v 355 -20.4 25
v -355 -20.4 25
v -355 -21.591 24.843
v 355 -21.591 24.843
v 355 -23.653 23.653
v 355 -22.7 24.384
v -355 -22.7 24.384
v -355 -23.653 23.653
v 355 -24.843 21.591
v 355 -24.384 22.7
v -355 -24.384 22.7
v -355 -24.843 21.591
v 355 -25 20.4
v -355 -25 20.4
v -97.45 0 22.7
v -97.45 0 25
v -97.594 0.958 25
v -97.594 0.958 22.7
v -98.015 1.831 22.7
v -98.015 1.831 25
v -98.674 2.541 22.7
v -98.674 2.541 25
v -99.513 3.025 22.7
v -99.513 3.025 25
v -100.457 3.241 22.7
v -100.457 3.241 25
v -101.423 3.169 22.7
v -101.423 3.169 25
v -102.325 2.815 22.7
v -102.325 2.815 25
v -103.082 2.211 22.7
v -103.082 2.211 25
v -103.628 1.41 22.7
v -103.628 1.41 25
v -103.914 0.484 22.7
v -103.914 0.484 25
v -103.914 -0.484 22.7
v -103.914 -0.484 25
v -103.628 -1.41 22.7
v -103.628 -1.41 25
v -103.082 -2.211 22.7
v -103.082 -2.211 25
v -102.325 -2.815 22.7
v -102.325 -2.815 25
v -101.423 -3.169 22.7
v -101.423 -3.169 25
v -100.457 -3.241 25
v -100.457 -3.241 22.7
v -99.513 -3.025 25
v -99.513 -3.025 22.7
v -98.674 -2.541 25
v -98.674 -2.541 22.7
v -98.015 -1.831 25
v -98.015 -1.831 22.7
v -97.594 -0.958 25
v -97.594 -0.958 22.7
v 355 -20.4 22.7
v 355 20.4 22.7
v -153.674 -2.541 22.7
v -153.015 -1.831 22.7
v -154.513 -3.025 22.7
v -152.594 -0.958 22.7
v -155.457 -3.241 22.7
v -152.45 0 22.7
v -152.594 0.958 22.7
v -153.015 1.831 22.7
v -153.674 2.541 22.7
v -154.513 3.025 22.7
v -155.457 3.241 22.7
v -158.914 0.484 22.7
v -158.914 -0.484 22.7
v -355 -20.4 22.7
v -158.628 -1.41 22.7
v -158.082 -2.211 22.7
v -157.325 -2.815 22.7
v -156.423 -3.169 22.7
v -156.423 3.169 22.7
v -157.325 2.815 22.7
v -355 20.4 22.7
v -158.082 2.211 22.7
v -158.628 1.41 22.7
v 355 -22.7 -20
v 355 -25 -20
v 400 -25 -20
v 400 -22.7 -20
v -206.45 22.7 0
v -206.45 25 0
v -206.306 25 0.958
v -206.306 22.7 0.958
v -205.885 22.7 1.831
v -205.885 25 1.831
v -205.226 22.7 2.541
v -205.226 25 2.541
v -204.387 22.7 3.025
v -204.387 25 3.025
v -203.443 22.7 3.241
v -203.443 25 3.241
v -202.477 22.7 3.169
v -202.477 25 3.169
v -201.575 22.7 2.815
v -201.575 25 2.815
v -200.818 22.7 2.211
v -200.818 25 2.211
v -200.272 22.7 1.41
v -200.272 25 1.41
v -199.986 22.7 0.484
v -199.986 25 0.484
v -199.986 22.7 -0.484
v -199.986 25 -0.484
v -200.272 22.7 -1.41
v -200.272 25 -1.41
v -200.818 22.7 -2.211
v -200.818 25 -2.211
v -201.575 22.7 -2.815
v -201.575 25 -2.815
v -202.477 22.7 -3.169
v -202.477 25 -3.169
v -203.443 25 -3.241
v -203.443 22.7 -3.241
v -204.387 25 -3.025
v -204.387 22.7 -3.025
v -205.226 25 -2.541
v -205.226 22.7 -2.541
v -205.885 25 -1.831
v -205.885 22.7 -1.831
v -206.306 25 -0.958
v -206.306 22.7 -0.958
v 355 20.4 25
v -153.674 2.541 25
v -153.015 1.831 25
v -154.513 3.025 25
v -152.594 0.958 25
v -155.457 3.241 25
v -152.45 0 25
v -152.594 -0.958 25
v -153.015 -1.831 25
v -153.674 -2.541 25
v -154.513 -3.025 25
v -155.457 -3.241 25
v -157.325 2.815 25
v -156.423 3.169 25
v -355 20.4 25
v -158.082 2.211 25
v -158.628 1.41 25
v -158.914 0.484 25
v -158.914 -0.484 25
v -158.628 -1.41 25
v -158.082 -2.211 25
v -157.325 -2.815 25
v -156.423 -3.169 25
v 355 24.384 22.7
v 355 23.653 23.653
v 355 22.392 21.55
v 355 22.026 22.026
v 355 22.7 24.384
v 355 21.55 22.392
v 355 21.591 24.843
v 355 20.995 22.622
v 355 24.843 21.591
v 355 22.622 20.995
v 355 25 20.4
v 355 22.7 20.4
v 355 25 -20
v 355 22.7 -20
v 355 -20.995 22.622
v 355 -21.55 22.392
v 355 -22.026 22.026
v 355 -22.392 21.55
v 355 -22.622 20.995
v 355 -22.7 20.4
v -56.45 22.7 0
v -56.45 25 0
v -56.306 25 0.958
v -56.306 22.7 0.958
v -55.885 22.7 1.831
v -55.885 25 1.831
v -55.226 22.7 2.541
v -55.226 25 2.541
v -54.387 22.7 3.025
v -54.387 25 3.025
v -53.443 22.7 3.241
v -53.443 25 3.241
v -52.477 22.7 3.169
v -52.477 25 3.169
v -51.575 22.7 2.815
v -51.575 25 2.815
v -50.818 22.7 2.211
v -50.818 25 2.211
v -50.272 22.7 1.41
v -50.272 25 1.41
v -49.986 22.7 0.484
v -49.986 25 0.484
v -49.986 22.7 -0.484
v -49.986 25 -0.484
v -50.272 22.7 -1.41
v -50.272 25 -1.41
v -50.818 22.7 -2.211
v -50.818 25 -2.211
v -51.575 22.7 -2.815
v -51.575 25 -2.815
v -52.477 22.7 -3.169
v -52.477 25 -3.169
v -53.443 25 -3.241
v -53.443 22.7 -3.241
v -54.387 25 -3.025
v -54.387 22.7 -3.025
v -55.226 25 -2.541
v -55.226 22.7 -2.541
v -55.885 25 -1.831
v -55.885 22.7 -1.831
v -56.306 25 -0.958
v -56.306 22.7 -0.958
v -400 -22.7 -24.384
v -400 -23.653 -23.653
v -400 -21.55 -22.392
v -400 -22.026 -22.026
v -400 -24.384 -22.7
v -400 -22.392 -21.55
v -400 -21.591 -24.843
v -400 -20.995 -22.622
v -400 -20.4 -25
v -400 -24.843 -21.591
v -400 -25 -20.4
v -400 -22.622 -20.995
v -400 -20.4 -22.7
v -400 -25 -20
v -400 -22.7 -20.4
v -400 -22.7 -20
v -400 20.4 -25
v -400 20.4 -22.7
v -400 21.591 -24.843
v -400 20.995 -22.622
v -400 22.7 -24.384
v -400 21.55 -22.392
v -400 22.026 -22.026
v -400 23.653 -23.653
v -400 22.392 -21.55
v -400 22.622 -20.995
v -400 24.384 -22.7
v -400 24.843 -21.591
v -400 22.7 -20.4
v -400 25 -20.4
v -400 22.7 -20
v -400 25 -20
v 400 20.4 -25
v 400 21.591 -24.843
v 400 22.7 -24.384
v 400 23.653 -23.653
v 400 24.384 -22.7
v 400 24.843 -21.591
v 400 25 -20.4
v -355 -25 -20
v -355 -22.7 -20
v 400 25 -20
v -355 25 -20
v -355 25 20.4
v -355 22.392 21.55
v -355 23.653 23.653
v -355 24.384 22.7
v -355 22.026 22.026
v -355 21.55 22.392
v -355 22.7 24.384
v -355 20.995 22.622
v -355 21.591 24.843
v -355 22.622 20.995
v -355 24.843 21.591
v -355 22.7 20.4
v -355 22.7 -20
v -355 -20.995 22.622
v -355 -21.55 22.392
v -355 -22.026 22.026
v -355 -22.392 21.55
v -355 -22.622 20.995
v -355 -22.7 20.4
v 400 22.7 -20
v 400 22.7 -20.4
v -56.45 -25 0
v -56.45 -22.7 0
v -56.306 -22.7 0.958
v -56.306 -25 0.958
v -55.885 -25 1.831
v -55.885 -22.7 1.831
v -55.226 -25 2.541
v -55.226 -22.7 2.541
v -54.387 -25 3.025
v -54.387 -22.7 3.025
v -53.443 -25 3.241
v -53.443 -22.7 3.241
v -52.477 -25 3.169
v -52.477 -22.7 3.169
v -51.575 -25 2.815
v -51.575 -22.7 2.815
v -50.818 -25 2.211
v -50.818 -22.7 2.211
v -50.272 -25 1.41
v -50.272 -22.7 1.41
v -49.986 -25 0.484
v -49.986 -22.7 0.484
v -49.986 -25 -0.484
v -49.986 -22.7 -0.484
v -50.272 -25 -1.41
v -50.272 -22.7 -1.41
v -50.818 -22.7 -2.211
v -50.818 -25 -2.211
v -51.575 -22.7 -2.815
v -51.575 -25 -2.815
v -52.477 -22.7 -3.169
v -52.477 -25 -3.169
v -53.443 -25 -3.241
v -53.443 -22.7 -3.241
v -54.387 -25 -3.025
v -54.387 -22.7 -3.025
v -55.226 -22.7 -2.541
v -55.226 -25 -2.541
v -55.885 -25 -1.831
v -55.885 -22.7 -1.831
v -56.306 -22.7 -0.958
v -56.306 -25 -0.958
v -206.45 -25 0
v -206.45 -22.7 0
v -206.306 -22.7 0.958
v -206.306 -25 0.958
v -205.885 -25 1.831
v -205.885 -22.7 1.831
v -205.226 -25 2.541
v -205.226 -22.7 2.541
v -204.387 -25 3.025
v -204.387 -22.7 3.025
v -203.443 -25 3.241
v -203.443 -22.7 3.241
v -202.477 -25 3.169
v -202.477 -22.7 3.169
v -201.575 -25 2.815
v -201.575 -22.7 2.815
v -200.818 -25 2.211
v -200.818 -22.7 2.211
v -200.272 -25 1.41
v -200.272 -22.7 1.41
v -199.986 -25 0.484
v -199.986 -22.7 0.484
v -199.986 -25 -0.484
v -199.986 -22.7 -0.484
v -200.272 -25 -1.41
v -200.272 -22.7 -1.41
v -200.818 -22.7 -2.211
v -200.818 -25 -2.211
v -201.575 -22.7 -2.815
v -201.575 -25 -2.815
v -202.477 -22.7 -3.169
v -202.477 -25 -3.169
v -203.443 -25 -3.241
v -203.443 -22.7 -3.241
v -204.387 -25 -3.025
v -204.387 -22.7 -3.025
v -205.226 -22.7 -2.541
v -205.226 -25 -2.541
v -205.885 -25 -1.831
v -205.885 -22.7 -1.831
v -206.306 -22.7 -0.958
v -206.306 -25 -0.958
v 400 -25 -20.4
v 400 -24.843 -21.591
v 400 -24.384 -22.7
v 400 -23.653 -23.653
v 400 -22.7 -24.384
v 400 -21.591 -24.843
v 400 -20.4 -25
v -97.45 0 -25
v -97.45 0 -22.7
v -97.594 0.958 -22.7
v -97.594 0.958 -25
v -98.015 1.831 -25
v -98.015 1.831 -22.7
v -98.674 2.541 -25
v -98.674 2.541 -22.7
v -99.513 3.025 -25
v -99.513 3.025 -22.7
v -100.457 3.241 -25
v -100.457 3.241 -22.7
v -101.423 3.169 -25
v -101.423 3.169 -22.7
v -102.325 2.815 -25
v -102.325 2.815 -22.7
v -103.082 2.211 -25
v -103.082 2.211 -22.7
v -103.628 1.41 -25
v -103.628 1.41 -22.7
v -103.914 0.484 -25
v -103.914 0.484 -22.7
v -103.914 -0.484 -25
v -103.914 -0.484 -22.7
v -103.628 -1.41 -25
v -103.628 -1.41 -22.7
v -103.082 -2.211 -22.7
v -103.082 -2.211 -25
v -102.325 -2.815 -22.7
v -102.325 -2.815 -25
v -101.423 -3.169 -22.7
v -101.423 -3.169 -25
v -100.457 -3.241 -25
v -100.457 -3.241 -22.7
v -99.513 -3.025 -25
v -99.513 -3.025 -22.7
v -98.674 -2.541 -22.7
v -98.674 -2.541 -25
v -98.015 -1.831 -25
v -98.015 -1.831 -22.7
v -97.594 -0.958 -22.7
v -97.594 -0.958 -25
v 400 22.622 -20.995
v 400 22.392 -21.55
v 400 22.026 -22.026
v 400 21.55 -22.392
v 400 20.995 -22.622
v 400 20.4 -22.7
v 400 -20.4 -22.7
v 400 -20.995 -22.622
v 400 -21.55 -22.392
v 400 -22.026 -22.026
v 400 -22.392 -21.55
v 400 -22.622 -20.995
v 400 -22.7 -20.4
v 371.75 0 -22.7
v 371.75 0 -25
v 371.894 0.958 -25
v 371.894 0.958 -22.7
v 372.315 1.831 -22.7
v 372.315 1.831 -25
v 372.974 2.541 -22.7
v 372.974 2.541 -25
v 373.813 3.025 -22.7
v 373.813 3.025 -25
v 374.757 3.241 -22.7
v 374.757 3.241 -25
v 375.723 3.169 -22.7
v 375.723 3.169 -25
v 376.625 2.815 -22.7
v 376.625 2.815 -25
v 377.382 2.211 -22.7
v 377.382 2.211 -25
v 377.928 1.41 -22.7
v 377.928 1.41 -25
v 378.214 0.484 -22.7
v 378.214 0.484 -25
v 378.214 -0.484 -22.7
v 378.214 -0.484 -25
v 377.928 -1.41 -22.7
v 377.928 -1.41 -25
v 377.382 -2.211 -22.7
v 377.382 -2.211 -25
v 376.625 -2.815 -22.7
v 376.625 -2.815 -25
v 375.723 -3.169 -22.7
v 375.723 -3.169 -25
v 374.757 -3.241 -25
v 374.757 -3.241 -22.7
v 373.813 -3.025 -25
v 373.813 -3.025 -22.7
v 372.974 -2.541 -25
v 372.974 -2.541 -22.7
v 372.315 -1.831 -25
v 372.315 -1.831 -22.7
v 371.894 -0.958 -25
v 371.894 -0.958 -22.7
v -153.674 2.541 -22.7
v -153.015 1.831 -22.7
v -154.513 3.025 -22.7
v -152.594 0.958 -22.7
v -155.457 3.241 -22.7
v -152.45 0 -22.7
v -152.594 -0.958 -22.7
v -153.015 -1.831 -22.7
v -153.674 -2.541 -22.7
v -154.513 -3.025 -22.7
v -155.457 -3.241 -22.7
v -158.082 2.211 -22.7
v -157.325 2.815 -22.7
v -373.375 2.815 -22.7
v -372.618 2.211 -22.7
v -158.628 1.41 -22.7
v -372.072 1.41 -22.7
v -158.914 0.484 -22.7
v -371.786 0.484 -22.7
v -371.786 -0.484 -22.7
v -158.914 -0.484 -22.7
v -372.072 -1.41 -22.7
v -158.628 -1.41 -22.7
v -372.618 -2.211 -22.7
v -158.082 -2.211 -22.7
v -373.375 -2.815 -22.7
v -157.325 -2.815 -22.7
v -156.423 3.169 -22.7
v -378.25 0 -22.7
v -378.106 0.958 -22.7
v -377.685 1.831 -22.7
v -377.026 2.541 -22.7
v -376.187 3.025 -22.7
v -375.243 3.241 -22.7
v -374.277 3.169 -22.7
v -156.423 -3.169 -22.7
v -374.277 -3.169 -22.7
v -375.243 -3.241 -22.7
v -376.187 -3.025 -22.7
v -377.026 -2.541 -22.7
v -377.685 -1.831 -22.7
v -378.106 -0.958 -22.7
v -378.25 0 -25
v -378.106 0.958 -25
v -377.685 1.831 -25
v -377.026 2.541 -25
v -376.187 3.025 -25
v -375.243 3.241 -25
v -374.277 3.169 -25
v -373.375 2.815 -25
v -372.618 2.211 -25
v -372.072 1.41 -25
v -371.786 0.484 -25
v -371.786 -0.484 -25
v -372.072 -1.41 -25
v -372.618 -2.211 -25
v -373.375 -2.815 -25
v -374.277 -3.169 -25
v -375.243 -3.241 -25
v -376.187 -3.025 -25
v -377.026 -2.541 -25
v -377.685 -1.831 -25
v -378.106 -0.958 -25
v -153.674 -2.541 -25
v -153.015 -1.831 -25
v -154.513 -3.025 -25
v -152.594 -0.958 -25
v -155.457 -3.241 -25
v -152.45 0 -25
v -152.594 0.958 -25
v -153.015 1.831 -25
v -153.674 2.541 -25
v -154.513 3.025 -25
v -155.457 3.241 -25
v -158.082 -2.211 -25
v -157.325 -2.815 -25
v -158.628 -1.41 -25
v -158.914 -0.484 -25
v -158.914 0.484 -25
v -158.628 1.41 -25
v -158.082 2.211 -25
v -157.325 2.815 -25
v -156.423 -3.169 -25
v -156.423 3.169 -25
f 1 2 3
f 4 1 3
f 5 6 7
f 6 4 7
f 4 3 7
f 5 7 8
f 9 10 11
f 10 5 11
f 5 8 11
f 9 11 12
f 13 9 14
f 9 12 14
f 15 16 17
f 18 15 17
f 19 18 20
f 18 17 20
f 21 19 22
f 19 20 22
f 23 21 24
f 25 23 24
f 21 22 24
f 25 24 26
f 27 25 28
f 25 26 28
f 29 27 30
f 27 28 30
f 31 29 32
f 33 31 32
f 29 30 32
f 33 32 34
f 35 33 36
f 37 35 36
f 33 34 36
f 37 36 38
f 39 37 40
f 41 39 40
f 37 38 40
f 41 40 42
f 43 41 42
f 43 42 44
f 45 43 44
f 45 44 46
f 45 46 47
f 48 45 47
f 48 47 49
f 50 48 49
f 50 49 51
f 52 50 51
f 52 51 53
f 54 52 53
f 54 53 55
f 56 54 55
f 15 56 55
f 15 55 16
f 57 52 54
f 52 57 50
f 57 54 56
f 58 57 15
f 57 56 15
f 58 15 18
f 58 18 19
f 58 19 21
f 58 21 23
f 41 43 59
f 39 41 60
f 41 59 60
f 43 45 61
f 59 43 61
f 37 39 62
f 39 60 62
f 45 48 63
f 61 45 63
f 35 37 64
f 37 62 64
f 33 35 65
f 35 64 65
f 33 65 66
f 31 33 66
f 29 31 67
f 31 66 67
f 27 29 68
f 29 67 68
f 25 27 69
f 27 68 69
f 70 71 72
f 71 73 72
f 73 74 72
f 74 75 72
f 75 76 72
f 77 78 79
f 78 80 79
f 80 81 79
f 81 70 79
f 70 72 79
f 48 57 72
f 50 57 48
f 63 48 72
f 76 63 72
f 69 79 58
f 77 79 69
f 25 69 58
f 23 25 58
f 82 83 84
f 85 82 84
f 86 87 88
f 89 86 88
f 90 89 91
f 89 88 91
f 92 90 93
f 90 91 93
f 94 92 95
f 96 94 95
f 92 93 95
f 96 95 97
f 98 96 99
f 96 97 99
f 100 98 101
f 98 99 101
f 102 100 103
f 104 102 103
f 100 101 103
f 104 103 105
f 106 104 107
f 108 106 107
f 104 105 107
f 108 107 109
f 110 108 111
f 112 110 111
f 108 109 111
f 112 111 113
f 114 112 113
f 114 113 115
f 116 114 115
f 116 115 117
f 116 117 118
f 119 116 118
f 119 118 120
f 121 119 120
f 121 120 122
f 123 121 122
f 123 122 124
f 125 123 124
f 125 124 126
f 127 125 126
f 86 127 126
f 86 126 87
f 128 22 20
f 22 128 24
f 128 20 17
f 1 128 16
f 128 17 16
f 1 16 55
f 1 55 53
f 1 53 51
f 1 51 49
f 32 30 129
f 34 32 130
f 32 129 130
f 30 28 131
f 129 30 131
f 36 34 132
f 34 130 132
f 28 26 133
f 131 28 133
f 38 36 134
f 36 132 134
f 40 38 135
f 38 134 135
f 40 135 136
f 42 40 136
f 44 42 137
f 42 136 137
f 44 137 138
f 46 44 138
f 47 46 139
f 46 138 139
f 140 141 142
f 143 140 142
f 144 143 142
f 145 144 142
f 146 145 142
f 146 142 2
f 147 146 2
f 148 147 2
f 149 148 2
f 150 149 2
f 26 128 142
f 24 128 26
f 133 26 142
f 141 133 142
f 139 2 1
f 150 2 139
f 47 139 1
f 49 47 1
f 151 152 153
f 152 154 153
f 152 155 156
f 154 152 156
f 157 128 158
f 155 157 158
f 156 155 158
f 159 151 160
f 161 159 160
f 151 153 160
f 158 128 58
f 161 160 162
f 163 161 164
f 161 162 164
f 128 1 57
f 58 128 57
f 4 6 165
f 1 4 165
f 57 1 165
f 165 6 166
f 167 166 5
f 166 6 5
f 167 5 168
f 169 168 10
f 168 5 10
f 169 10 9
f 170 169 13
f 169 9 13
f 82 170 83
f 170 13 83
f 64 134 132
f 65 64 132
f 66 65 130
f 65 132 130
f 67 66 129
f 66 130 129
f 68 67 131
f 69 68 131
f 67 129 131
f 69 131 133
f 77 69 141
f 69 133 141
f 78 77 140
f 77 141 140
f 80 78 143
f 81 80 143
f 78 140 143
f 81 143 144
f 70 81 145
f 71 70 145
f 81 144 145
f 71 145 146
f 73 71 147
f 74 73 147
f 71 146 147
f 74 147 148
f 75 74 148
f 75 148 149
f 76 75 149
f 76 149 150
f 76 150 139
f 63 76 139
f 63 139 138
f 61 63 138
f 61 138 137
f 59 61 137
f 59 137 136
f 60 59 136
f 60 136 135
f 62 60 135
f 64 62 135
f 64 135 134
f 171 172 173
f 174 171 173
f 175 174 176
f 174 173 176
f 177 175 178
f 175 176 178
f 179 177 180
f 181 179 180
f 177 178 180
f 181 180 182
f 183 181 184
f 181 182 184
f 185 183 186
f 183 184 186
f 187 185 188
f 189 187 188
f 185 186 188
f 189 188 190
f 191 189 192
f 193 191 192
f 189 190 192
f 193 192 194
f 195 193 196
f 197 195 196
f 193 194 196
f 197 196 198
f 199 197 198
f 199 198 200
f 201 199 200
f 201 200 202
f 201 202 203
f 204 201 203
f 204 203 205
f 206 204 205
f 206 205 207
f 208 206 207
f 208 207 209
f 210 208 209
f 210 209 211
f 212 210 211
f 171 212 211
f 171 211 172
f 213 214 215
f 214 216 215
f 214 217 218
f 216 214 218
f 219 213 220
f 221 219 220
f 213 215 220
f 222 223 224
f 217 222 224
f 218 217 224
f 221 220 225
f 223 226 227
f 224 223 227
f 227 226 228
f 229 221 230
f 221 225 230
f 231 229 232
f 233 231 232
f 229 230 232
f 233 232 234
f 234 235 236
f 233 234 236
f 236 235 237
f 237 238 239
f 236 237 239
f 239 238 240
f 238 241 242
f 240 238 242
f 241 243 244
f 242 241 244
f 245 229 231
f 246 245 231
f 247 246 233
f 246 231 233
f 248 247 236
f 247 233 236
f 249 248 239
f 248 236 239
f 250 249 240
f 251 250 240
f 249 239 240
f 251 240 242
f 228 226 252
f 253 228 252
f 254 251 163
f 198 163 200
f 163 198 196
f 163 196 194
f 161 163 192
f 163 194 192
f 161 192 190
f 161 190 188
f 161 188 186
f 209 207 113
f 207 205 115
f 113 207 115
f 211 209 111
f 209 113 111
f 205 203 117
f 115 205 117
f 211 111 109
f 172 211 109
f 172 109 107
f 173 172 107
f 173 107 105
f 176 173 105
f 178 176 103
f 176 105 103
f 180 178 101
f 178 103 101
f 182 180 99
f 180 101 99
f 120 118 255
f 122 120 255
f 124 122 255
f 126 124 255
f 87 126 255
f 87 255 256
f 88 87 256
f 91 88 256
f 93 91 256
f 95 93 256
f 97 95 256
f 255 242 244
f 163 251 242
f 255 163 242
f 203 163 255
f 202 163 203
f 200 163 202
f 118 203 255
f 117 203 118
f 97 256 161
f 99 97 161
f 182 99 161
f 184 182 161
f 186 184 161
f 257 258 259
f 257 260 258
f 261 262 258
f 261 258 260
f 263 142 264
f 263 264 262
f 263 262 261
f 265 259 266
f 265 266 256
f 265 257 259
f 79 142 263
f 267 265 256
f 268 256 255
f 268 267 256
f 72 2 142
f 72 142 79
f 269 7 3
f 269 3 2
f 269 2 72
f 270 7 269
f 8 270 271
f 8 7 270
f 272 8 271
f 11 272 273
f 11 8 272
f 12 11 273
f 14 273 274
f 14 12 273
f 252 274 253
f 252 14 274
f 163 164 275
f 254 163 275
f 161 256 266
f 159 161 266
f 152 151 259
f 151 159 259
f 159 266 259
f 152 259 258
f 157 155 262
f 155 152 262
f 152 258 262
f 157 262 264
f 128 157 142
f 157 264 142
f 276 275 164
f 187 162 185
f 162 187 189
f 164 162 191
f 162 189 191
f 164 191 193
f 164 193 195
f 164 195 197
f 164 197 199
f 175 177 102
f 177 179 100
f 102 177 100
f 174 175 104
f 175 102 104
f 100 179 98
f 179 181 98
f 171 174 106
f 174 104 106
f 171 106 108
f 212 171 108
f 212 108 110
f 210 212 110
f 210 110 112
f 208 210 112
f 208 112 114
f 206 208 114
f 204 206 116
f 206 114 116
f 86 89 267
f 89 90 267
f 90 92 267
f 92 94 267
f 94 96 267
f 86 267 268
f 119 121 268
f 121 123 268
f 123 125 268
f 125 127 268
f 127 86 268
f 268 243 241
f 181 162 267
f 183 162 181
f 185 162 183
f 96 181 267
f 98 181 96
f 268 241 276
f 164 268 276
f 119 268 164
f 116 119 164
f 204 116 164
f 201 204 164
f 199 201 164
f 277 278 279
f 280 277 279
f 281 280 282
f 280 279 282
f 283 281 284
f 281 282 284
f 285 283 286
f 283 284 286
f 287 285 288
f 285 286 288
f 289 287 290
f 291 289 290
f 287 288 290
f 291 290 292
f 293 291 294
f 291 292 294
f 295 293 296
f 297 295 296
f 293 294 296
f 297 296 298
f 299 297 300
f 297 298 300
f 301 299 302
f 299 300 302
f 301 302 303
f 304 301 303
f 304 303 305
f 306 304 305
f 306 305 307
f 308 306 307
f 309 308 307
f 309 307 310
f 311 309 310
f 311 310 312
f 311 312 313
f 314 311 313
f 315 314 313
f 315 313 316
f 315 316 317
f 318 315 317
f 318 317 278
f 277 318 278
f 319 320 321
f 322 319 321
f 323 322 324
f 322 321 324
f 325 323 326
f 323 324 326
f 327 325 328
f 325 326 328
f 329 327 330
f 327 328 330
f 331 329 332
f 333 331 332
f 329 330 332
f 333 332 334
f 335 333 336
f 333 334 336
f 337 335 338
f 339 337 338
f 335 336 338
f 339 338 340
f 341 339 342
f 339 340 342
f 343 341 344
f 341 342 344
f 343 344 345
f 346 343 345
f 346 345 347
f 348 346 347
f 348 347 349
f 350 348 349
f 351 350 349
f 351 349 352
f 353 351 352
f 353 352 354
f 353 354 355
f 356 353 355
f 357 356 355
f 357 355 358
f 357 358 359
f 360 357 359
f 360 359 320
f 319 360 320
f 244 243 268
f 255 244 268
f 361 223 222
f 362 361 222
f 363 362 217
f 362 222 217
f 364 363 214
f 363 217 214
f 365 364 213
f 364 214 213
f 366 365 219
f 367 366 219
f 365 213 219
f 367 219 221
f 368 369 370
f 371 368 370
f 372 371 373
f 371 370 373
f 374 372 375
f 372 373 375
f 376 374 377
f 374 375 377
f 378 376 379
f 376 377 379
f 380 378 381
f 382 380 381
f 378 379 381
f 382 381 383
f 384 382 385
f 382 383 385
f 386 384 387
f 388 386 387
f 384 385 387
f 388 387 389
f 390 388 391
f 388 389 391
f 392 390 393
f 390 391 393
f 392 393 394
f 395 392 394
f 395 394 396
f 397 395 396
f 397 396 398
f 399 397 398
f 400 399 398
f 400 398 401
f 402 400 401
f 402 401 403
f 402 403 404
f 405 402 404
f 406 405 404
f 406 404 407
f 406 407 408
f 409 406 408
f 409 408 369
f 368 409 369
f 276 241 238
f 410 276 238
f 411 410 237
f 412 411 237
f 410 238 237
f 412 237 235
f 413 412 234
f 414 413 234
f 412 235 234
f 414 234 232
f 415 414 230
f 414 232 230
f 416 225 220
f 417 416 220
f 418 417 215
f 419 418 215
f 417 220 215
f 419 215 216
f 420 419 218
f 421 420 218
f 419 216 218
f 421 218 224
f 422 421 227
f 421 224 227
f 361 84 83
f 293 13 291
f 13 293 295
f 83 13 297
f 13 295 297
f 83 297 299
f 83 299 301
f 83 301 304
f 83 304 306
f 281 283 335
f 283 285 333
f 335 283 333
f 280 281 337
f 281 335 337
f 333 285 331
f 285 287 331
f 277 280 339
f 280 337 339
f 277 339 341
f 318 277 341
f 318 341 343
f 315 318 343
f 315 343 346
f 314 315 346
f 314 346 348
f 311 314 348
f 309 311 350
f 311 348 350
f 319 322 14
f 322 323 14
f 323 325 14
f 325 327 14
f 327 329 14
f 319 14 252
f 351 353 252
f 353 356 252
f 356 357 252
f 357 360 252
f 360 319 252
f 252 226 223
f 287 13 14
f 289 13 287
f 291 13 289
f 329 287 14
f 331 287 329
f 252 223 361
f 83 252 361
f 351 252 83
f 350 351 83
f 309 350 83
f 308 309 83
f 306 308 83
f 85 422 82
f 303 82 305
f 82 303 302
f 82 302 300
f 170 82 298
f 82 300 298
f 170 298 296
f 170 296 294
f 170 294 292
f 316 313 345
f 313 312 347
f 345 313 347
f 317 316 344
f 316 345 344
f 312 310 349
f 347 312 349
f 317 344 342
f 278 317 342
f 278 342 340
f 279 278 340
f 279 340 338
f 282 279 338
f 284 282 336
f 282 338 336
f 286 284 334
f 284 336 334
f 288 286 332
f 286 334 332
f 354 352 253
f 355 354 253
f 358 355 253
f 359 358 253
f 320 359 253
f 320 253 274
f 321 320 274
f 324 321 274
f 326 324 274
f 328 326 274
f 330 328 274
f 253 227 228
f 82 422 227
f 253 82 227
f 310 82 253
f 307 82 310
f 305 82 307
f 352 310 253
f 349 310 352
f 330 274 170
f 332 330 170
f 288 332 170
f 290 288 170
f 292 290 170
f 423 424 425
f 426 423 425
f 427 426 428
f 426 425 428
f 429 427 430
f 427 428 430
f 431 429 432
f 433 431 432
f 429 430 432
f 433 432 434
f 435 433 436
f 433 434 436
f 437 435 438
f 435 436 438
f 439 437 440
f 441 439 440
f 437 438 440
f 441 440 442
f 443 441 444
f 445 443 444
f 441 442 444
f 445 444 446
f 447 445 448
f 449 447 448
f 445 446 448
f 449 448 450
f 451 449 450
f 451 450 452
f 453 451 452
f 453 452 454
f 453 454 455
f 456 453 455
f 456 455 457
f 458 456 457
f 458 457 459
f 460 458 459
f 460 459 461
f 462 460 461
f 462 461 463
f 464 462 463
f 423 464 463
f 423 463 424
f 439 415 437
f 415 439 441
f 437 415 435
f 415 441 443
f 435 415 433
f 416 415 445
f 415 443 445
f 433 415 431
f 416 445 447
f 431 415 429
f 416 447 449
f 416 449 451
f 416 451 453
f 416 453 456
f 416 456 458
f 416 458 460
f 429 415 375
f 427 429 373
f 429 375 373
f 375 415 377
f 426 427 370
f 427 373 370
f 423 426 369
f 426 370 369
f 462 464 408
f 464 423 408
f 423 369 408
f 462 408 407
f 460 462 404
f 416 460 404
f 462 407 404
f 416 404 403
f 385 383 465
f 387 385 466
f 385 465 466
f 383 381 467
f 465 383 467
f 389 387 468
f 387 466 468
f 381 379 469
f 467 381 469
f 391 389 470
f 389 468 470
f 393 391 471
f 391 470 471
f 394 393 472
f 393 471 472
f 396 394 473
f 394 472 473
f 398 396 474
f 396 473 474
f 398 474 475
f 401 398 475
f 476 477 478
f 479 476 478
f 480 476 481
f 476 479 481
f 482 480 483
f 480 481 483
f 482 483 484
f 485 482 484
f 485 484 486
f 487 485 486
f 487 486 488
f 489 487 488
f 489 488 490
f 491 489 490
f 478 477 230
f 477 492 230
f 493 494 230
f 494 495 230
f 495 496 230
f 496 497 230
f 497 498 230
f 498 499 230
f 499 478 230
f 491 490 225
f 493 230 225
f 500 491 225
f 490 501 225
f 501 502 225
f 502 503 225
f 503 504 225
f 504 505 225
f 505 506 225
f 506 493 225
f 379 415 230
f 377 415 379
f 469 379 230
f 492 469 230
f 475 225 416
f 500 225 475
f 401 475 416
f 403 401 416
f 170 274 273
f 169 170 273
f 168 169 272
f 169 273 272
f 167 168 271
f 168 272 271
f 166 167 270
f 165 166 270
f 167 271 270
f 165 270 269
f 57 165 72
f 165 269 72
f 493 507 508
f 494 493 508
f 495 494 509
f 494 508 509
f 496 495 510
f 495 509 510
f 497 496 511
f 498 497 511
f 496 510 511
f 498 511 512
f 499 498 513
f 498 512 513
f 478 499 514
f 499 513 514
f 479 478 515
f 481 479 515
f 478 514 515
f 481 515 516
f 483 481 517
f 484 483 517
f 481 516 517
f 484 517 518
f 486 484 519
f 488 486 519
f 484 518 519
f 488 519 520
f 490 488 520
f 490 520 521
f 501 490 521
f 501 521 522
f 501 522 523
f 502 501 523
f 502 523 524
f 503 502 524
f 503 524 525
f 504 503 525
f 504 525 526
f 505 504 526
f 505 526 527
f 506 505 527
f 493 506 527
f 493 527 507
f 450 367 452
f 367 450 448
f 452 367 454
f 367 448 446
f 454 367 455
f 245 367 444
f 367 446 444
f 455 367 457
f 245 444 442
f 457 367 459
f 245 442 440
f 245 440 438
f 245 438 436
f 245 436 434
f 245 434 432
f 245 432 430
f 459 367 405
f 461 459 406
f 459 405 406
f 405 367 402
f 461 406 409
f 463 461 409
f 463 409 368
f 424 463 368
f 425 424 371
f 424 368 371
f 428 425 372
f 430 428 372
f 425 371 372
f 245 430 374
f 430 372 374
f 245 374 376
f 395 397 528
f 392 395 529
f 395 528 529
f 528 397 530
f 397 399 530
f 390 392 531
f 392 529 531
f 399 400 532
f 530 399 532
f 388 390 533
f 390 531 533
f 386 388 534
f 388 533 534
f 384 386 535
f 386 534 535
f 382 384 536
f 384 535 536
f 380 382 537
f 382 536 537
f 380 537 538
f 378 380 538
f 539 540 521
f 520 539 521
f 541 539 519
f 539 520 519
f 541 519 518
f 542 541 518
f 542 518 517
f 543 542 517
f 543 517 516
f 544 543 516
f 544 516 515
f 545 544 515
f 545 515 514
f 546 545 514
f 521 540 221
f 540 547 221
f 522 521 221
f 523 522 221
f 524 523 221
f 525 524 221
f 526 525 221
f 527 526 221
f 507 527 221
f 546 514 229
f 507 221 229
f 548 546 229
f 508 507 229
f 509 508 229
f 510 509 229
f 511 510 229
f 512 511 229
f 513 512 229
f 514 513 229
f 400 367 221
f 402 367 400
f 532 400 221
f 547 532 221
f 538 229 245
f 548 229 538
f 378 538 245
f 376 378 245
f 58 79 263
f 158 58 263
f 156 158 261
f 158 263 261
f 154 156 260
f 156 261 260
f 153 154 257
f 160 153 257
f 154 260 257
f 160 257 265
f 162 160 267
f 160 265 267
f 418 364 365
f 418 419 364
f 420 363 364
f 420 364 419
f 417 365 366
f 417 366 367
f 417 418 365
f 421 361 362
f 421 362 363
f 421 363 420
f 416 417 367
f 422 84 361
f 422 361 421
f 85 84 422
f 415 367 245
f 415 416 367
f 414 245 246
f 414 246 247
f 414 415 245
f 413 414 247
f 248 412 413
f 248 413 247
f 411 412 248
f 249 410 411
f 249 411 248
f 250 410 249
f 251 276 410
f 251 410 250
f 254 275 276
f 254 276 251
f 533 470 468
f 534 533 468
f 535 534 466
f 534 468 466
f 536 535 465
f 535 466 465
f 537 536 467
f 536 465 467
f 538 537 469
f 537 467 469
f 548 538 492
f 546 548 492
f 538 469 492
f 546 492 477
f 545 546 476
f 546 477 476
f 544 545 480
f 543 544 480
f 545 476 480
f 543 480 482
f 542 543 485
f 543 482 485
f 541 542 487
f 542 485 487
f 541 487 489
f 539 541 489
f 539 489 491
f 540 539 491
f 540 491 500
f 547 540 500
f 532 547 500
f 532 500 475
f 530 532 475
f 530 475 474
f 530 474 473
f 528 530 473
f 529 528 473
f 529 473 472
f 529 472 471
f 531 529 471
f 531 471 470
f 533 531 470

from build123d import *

# Parameters (mm, degrees)
SHS_C450_AS_50X50X2_3_SHS_C450_1_DEPTH = 800
CUT_EXTRUDE1_DEPTH                     = 402.559460105
CUT_EXTRUDE1_DEPTH_BACK                = 402.559460105
SKETCH20_W                             = 45
SKETCH20_H                             = 45
SKETCH21_R                             = 3.25
CUT_EXTRUDE2_DEPTH                     = 10
SKETCH22_R                             = 3.25
CUT_EXTRUDE3_DEPTH                     = 404.887360535
SKETCH23_R                             = 3.25
CUT_EXTRUDE4_DEPTH                     = 404.887360535


with BuildPart() as part:
    # Sketch19 → Shs c450 as 50X50X2.3 SHS C450(1) (new body)
    with BuildSketch(Plane.YZ.offset(-400)):
        with BuildLine():
            Line((-20.4, -25), (20.4, -25))
            ThreePointArc((20.4, -25), (23.652691193, -23.652691193), (25, -20.4))
            Line((25, -20.4), (25, 20.4))
            ThreePointArc((25, 20.4), (23.652691193, 23.652691193), (20.4, 25))
            Line((20.4, 25), (-20.4, 25))
            ThreePointArc((-20.4, 25), (-23.652691193, 23.652691193), (-25, 20.4))
            Line((-25, 20.4), (-25, -20.4))
            ThreePointArc((-25, -20.4), (-23.652691193, -23.652691193), (-20.4, -25))
        make_face()
        with BuildLine():
            Line((-20.4, 22.7), (20.4, 22.7))
            ThreePointArc((20.4, 22.7), (22.026345597, 22.026345597), (22.7, 20.4))
            Line((22.7, 20.4), (22.7, -20.4))
            ThreePointArc((22.7, -20.4), (22.026345597, -22.026345597), (20.4, -22.7))
            Line((20.4, -22.7), (-20.4, -22.7))
            ThreePointArc((-20.4, -22.7), (-22.026345597, -22.026345597), (-22.7, -20.4))
            Line((-22.7, -20.4), (-22.7, 20.4))
            ThreePointArc((-22.7, 20.4), (-22.026345597, 22.026345597), (-20.4, 22.7))
        make_face(mode=Mode.SUBTRACT)
    extrude(amount=SHS_C450_AS_50X50X2_3_SHS_C450_1_DEPTH)

    # Sketch20 → Cut-Extrude1 (cut, two sides: drawn at the far end of the back side and taken through both)
    with BuildSketch(Plane(origin=(0, 0, 0), x_dir=(1, 0, 0), z_dir=(0, 1, 0)).offset(-CUT_EXTRUDE1_DEPTH_BACK)):
        with Locations((-377.5, -2.5)):
            Rectangle(SKETCH20_W, SKETCH20_H)
        with Locations((377.5, -2.5)):
            Rectangle(SKETCH20_W, SKETCH20_H)
    extrude(amount=CUT_EXTRUDE1_DEPTH + CUT_EXTRUDE1_DEPTH_BACK, mode=Mode.SUBTRACT)

    # Sketch21 → Cut-Extrude2 (cut)
    with BuildSketch(Plane(origin=(0, 0, -25), x_dir=(-1, 0, 0), z_dir=(0, 0, -1))):
        with Locations((-375, 0)):
            Circle(SKETCH21_R)
        with Locations((375, 0)):
            Circle(SKETCH21_R)
    extrude(amount=-CUT_EXTRUDE2_DEPTH, mode=Mode.SUBTRACT)

    # Sketch22 → Cut-Extrude3 (cut, through all)
    with BuildSketch(Plane.XY.offset(25)):
        with Locations((-155.7, 0)):
            Circle(SKETCH22_R)
        with Locations((-100.7, 0)):
            Circle(SKETCH22_R)
    extrude(amount=-CUT_EXTRUDE3_DEPTH, mode=Mode.SUBTRACT)

    # Sketch23 → Cut-Extrude4 (cut, through all)
    with BuildSketch(Plane(origin=(0, 25, 0), x_dir=(1, 0, 0), z_dir=(0, 1, 0))):
        with Locations(Location((-203.2, 0, 0), (0, 0, 180))):
            Circle(SKETCH23_R)
        with Locations(Location((-53.2, 0, 0), (0, 0, 180))):
            Circle(SKETCH23_R)
    extrude(amount=-CUT_EXTRUDE4_DEPTH, mode=Mode.SUBTRACT)


solid = part.part
